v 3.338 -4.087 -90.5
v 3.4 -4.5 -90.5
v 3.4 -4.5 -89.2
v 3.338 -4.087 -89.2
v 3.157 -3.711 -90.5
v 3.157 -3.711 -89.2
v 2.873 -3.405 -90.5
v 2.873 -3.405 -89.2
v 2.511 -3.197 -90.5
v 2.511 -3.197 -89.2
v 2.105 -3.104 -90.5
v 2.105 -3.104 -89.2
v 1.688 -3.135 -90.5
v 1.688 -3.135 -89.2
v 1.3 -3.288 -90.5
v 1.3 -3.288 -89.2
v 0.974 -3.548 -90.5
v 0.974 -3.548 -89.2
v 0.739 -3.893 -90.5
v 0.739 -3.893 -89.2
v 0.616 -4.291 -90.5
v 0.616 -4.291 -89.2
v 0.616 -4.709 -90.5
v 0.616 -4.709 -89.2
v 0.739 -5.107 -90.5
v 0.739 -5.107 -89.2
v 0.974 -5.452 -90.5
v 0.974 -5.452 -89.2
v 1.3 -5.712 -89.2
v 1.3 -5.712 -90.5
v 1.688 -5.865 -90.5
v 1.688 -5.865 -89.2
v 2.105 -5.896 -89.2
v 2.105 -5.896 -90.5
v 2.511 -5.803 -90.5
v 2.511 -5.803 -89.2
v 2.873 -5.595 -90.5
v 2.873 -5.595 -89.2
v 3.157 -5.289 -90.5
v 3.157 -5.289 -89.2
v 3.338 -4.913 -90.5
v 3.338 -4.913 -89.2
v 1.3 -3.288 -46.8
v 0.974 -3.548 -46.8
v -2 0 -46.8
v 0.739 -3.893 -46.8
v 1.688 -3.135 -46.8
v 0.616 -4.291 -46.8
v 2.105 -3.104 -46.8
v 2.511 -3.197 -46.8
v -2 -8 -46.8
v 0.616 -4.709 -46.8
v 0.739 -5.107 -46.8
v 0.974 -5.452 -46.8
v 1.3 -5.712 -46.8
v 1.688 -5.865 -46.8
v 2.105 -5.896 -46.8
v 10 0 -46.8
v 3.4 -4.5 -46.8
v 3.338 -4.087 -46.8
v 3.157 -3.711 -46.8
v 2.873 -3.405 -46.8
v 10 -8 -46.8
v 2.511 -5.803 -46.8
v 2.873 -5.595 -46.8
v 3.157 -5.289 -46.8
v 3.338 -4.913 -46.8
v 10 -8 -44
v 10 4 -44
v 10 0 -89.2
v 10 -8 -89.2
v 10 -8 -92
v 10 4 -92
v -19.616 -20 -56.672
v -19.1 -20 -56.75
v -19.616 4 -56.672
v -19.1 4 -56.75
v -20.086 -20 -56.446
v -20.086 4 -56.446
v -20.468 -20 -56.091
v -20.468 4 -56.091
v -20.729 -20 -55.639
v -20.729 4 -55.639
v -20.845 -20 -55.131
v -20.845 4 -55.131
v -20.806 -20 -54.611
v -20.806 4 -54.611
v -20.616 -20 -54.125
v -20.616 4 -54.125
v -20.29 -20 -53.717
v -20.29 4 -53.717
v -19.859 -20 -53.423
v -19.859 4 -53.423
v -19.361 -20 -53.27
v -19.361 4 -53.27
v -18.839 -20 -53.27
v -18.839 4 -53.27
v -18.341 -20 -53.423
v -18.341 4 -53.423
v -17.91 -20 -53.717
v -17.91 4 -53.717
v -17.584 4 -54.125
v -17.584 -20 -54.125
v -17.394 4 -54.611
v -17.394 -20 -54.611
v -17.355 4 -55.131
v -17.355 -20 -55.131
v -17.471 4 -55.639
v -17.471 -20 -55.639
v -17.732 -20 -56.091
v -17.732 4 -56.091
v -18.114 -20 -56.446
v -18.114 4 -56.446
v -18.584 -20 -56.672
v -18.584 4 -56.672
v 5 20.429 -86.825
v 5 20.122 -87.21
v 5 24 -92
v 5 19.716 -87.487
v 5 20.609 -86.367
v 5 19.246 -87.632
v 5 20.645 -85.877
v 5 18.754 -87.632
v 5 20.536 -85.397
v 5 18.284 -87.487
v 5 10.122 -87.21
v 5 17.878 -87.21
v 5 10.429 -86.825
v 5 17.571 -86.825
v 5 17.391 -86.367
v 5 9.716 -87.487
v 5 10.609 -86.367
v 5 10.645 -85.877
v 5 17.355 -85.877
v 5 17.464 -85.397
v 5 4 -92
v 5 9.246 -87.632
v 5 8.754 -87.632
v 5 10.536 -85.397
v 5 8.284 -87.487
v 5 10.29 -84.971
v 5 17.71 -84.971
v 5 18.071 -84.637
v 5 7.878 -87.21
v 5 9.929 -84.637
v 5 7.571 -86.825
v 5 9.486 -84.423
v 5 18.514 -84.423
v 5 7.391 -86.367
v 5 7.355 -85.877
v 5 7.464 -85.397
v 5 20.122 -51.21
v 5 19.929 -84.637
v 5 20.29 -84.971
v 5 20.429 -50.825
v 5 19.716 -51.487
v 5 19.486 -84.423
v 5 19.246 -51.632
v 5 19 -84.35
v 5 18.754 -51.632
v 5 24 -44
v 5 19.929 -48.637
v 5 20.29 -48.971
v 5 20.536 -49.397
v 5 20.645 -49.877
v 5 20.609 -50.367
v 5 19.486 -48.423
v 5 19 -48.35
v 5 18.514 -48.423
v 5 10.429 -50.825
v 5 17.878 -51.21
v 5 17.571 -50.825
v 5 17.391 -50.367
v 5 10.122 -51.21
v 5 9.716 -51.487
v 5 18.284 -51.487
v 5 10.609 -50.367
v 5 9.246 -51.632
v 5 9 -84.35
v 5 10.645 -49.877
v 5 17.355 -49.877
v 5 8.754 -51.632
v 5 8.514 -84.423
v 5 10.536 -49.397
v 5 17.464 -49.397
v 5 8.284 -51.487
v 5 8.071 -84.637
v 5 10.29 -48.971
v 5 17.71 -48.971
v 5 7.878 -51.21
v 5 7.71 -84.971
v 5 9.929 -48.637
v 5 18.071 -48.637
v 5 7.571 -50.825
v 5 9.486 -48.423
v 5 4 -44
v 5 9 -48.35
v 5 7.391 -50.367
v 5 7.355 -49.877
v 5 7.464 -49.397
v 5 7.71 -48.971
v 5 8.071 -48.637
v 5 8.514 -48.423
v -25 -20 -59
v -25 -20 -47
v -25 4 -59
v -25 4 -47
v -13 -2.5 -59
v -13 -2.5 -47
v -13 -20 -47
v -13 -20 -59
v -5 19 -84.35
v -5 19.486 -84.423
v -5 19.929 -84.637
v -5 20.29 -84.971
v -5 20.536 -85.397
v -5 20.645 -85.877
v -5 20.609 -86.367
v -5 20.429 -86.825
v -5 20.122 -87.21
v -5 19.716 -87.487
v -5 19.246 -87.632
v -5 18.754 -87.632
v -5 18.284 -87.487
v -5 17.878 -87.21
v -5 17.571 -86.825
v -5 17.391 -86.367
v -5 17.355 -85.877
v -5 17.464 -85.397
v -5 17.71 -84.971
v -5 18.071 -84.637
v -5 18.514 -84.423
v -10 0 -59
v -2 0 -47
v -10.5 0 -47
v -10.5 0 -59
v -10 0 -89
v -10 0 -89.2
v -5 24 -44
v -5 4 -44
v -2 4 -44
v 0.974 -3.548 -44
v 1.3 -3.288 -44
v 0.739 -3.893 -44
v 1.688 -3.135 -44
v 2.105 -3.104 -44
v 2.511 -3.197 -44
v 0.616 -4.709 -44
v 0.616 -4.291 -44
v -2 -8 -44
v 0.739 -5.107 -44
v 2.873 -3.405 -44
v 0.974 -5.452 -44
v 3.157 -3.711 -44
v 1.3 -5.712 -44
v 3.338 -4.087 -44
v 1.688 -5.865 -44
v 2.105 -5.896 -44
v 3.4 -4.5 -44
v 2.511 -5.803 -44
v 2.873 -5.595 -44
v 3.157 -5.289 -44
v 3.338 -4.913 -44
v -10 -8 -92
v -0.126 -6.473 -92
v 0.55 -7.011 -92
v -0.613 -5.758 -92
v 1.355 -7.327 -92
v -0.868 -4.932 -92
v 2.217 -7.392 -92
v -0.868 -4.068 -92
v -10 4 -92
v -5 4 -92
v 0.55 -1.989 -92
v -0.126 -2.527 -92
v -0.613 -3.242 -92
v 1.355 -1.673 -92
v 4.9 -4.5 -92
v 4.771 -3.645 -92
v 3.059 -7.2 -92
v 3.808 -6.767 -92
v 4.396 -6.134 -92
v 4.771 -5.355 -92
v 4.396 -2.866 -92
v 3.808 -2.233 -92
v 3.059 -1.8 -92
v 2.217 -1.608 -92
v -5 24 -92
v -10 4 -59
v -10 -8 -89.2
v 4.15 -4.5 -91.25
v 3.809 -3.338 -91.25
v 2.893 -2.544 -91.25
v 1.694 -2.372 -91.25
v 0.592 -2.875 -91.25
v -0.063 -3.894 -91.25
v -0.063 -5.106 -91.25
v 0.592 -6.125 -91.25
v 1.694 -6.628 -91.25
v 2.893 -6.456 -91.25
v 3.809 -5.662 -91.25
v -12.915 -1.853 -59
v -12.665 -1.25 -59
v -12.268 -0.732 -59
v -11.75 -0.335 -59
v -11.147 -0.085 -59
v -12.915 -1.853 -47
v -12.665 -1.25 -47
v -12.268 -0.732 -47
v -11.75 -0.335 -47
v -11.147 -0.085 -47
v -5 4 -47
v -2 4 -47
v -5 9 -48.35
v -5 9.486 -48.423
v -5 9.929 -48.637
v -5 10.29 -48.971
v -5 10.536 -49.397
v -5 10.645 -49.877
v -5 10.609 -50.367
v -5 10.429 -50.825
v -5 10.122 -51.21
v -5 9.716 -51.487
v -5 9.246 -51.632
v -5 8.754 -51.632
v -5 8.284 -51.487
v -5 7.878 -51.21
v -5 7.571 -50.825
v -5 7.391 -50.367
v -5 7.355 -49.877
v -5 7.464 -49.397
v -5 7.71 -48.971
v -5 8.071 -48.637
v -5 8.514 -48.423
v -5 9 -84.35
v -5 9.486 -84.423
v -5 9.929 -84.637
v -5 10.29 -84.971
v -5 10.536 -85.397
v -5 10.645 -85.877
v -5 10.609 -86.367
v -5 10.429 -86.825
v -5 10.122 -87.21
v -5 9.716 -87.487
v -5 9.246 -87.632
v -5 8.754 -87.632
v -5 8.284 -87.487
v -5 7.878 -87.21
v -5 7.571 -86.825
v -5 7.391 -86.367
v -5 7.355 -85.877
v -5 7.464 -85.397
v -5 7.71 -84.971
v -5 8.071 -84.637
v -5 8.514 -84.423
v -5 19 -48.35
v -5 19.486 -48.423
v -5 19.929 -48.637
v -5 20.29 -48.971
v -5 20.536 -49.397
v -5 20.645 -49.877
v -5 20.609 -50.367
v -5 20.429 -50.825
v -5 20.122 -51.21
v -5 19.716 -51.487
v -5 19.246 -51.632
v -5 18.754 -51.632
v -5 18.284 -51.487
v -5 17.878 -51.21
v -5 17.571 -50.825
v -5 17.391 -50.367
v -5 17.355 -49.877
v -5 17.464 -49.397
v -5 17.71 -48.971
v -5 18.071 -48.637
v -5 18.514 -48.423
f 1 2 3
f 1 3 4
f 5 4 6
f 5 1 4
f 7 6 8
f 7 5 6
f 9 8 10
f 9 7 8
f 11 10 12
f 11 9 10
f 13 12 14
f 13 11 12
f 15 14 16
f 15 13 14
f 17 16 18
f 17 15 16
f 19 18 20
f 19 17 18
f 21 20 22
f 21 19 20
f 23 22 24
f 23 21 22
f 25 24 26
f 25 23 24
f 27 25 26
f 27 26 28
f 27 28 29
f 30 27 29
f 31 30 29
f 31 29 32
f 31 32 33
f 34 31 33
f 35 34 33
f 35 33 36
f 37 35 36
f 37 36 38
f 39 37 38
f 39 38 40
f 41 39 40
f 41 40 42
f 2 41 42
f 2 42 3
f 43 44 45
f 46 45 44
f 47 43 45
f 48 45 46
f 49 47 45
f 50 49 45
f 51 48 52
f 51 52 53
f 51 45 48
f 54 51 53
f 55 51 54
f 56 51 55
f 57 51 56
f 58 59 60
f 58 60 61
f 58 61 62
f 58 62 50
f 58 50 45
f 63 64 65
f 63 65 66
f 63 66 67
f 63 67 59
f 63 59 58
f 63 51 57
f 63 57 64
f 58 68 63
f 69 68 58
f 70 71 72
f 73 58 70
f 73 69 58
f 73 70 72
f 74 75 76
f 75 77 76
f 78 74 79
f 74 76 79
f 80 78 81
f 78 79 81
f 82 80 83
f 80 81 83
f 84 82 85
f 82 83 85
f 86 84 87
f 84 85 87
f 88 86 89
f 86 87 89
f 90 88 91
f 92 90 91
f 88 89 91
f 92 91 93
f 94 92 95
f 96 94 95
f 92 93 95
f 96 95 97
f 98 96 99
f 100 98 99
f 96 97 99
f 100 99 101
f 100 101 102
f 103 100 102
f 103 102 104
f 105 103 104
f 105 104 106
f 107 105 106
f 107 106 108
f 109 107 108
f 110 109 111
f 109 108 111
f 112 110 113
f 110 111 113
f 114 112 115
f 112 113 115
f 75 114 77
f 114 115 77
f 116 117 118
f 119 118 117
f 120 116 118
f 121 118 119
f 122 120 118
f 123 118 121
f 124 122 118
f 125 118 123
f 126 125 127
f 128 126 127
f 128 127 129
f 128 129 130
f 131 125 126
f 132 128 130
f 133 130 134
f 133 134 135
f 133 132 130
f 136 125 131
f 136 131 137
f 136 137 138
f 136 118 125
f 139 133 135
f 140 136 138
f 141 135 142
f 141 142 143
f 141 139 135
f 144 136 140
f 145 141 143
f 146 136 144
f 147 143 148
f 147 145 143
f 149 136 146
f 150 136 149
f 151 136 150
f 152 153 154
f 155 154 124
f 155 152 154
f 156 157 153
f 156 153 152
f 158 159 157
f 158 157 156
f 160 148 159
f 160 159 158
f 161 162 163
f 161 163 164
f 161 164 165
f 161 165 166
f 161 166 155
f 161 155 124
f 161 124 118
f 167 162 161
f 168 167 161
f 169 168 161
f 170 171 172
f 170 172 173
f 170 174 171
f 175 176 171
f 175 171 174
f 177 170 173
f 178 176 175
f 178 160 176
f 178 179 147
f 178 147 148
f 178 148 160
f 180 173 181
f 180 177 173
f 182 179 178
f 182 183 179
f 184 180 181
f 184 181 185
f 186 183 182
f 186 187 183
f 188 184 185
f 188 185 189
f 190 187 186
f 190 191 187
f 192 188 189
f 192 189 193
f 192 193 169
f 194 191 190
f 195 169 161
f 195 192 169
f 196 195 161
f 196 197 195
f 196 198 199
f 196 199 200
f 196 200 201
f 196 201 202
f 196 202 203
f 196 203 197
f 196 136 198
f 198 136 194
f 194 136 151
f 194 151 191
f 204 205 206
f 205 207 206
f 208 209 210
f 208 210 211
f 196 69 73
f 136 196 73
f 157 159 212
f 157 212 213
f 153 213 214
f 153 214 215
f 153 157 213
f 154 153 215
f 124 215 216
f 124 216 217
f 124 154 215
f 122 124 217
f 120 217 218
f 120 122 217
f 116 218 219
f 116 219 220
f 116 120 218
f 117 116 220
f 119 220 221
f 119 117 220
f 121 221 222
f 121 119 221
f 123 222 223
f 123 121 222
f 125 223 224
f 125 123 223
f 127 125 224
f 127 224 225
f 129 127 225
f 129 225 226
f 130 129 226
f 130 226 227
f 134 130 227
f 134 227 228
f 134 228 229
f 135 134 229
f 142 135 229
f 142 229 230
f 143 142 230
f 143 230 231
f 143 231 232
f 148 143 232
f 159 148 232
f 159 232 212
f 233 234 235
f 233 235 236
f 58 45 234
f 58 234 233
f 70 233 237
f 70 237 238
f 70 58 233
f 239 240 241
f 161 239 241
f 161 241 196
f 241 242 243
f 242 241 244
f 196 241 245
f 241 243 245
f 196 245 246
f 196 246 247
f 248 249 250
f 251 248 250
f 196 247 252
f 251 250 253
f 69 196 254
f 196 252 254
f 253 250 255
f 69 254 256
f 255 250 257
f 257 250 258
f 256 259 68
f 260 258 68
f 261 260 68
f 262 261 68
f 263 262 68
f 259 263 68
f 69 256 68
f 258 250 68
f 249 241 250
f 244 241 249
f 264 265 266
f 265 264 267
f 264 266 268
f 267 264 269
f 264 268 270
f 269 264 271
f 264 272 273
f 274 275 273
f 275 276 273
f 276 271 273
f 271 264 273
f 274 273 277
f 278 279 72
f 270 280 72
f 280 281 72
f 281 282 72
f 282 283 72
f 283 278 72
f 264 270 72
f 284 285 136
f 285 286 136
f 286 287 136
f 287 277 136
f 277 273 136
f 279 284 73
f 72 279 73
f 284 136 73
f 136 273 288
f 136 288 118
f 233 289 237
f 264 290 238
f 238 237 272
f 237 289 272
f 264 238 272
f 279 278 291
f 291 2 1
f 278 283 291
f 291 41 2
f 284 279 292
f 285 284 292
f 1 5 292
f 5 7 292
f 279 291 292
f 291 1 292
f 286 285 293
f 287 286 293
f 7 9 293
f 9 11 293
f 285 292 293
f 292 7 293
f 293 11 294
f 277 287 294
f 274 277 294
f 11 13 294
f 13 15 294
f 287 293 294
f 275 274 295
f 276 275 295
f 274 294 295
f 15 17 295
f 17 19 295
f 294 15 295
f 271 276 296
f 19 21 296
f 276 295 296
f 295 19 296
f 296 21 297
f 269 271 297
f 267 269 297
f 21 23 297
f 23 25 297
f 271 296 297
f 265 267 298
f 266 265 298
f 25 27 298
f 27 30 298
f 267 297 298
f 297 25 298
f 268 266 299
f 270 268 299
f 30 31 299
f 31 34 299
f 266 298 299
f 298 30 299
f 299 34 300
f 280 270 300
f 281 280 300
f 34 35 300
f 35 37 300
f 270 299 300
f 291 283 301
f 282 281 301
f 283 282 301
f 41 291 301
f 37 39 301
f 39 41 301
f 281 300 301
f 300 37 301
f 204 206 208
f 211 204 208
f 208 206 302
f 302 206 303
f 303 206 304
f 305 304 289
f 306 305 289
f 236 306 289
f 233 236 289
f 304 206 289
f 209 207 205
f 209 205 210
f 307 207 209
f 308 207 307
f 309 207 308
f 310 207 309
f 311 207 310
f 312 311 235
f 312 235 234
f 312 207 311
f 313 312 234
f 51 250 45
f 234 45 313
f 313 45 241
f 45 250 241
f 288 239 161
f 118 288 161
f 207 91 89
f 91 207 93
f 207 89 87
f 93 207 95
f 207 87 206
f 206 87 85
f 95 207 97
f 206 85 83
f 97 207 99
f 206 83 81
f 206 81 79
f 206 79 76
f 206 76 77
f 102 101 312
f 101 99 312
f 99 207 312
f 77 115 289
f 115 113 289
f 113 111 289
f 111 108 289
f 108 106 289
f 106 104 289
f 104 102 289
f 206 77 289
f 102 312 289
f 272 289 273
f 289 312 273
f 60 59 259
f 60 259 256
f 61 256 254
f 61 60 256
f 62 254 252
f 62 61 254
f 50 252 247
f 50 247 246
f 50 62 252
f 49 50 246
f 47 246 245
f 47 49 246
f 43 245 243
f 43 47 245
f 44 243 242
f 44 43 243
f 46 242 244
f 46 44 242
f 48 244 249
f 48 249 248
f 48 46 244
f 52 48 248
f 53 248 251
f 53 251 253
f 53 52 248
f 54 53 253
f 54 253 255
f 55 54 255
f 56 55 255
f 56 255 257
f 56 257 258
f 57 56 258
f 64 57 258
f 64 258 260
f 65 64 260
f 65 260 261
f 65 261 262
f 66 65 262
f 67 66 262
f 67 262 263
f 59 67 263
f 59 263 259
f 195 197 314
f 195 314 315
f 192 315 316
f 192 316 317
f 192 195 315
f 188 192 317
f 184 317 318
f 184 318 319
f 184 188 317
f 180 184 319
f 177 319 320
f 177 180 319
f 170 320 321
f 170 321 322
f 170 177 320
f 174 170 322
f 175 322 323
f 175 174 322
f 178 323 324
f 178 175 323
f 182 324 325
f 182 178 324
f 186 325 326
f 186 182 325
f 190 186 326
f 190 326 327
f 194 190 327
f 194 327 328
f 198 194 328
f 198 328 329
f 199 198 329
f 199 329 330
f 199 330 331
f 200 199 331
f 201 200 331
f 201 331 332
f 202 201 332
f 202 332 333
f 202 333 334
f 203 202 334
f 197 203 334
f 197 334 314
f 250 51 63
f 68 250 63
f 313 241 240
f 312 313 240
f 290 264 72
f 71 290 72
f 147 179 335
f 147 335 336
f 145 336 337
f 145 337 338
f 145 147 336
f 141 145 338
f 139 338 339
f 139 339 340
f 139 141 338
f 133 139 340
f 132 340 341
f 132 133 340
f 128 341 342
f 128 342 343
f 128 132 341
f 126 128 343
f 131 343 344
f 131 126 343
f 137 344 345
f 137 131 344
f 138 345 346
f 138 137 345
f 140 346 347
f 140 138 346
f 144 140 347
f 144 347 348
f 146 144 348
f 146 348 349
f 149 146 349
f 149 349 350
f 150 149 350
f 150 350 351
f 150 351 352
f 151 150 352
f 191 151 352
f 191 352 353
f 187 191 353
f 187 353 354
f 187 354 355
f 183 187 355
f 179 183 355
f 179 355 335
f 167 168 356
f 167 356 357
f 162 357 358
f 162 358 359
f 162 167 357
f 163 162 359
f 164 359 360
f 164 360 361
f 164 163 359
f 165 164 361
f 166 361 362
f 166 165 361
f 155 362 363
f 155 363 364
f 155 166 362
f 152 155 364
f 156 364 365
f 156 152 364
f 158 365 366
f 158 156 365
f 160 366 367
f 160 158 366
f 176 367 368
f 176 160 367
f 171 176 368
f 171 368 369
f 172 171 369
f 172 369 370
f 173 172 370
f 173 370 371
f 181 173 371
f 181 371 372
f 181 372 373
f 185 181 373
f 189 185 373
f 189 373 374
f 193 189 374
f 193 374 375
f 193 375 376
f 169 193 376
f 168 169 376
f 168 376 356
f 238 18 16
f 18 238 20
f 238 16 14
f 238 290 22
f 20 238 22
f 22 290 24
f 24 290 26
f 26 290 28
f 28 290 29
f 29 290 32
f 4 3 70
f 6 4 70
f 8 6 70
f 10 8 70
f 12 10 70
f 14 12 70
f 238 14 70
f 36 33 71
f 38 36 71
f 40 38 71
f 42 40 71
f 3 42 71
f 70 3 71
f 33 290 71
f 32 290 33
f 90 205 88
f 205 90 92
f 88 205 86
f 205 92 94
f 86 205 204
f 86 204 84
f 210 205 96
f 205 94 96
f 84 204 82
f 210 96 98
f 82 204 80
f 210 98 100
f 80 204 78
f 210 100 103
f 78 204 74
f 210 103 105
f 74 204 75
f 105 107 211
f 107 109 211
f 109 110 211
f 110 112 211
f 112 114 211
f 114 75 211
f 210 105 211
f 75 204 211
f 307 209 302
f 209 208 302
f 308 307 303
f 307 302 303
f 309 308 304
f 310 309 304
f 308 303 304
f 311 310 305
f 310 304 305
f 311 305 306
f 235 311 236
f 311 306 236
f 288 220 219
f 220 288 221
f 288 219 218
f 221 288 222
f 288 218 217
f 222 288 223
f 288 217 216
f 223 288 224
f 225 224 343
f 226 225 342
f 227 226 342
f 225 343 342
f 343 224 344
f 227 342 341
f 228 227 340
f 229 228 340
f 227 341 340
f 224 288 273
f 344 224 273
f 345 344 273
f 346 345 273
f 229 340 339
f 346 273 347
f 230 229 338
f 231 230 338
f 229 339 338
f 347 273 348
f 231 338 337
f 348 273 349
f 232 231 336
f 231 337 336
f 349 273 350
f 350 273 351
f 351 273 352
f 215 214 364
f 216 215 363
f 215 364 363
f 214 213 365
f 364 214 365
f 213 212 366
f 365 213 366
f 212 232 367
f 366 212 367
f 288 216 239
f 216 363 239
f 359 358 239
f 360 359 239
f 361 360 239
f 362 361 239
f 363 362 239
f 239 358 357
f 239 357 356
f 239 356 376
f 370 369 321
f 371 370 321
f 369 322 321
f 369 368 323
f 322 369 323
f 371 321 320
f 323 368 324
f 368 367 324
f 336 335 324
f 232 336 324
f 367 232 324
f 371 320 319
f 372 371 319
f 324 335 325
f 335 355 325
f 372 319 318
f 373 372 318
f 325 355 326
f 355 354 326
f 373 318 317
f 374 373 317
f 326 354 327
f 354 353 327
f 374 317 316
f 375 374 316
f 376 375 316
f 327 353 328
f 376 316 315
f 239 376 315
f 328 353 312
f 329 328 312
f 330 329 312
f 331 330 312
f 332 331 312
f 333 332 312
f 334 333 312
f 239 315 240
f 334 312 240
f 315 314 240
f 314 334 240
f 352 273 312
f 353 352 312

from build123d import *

# Parameters (mm, degrees)
SKETCH_1_W          = 20
SKETCH_1_H          = 48
EXTRUDE_2_DEPTH     = 4
SKETCH_3_W          = 20
SKETCH_3_H          = 3
EXTRUDE_3_DEPTH     = 8
SKETCH_4_W          = 12
SKETCH_4_H          = 4
EXTRUDE_4_DEPTH     = 15
SKETCH_5_R          = 1.75
CUT_EXTRUDE_2_DEPTH = 37.674241642
SKETCH_6_W          = 12
SKETCH_6_H          = 12
SKETCH_6_R          = 1.75
EXTRUDE_5_DEPTH     = 20
SKETCH_7_W          = 10
SKETCH_7_H          = 48
EXTRUDE_6_DEPTH     = 20
SKETCH_8_R          = 1.65
CUT_EXTRUDE_3_DEPTH = 46.299006612
CHAMFER_1_SIZE      = 3
FILLET_2_R          = 2.5
SKETCH_11_W         = 8
SKETCH_11_H         = 12
CUT_EXTRUDE_5_DEPTH = 3
SKETCH_12_R         = 1.4
CUT_EXTRUDE_6_DEPTH = 60.203040462
CHAMFER_2_SIZE      = 1.5
SKETCH_14_W         = 21.274376693
SKETCH_14_H         = 42.4
CUT_EXTRUDE_7_DEPTH = 8
SKETCH_15_W         = 103.642401021
SKETCH_15_H         = 66.860791826
CUT_EXTRUDE_8_DEPTH = 106


with BuildPart() as part:
    # 草图1 → 凸台-拉伸2 (new body)
    with BuildSketch(Plane(origin=(0, 0, 0), x_dir=(1, 0, 0), z_dir=(0, 1, 0))):
        Rectangle(SKETCH_1_W, SKETCH_1_H)
    extrude(amount=EXTRUDE_2_DEPTH)

    # 草图3 → 凸台-拉伸3 (add)
    with BuildSketch(Plane.XZ):
        with Locations((0, 22.5)):
            Rectangle(SKETCH_3_W, SKETCH_3_H)
        with Locations((0, -22.5)):
            Rectangle(SKETCH_3_W, SKETCH_3_H)
    extrude(amount=EXTRUDE_3_DEPTH)

    # 草图4 → 凸台-拉伸4 (add)
    with BuildSketch(Plane.ZY.offset(10)):
        with Locations((-15, 2)):
            Rectangle(SKETCH_4_W, SKETCH_4_H)
    extrude(amount=EXTRUDE_4_DEPTH)

    # 草图5 → 切除-拉伸2 (cut, through all)
    with BuildSketch(Plane(origin=(0, 4, 0), x_dir=(1, 0, 0), z_dir=(0, 1, 0))):
        with Locations(Location((-19.1, 13, 0), (0, 0, 270))):
            Circle(SKETCH_5_R)
    extrude(amount=-CUT_EXTRUDE_2_DEPTH, mode=Mode.SUBTRACT)

    # 草图6 → 凸台-拉伸5 (add)
    with BuildSketch(Plane.XZ):
        with Locations((-19, -15)):
            Rectangle(SKETCH_6_W, SKETCH_6_H)
        with Locations(Location((-19.1, -13, 0), (0, 0, 90))):
            Circle(SKETCH_6_R, mode=Mode.SUBTRACT)
    extrude(amount=EXTRUDE_5_DEPTH)

    # 草图7 → 凸台-拉伸6 (add)
    with BuildSketch(Plane(origin=(0, 4, 0), x_dir=(1, 0, 0), z_dir=(0, 1, 0))):
        Rectangle(SKETCH_7_W, SKETCH_7_H)
    extrude(amount=EXTRUDE_6_DEPTH)

    # 草图8 → 切除-拉伸3 (cut, through all)
    with BuildSketch(Plane(origin=(5, 0, 0), x_dir=(0, 0, -1), z_dir=(1, 0, 0))):
        with Locations((-18, 19)):
            Circle(SKETCH_8_R)
        with Locations((18, 19)):
            Circle(SKETCH_8_R)
        with Locations((18, 9)):
            Circle(SKETCH_8_R)
        with Locations((-18, 9)):
            Circle(SKETCH_8_R)
    extrude(amount=-CUT_EXTRUDE_3_DEPTH, mode=Mode.SUBTRACT)

    # 倒角1
    chamfer_1_edges = [part.edges().sort_by_distance(p)[0] for p in [
        (-10, -2, -24),
    ]]
    chamfer(chamfer_1_edges, length=CHAMFER_1_SIZE - 0.0001)  # a hair under: the kernel refuses the full size

    # 圆角2
    fillet_2_edges = [part.edges().sort_by_distance(p)[0] for p in [
        (-13, 0, -15),
    ]]
    fillet(fillet_2_edges, radius=FILLET_2_R)

    # 草图11 → 切除-拉伸5 (cut)
    with BuildSketch(Plane(origin=(0, 0, -24), x_dir=(-1, 0, 0), z_dir=(0, 0, -1))):
        with Locations((6, -2)):
            Rectangle(SKETCH_11_W, SKETCH_11_H)
    extrude(amount=-CUT_EXTRUDE_5_DEPTH, mode=Mode.SUBTRACT)

    # 草图12 → 切除-拉伸6 (cut, through all)
    with BuildSketch(Plane.XY.offset(24)):
        with Locations((2, -4.5)):
            Circle(SKETCH_12_R)
    extrude(amount=-CUT_EXTRUDE_6_DEPTH, mode=Mode.SUBTRACT)

    # 倒角2
    chamfer_2_edges = [part.edges().sort_by_distance(p)[0] for p in [
        (0.6, -4.5, 24),
    ]]
    chamfer(chamfer_2_edges, length=CHAMFER_2_SIZE)

    # 草图14 → 切除-拉伸7 (cut)
    with BuildSketch(Plane.XZ.offset(8)):
        with Locations((0.637188347, 0)):
            Rectangle(SKETCH_14_W, SKETCH_14_H)
    extrude(amount=-CUT_EXTRUDE_7_DEPTH, mode=Mode.SUBTRACT)


with BuildPart() as body_2:
    # 镜向2: mirrored copy
    add(part.part.mirror(Plane(origin=(0, 0, -34), x_dir=(1, 0, 0), z_dir=(0, 0, -1))))


with BuildPart() as part_1:
    add(part.part)

    # 草图15 → 切除-拉伸8 (cut, through all)
    with BuildSketch(Plane(origin=(0, 24, 0), x_dir=(1, 0, 0), z_dir=(0, 1, 0))):
        with Locations((-18.895114943, 2.939974457)):
            Rectangle(SKETCH_15_W, SKETCH_15_H)
    extrude(amount=-CUT_EXTRUDE_8_DEPTH, mode=Mode.SUBTRACT)


solid = body_2.part
